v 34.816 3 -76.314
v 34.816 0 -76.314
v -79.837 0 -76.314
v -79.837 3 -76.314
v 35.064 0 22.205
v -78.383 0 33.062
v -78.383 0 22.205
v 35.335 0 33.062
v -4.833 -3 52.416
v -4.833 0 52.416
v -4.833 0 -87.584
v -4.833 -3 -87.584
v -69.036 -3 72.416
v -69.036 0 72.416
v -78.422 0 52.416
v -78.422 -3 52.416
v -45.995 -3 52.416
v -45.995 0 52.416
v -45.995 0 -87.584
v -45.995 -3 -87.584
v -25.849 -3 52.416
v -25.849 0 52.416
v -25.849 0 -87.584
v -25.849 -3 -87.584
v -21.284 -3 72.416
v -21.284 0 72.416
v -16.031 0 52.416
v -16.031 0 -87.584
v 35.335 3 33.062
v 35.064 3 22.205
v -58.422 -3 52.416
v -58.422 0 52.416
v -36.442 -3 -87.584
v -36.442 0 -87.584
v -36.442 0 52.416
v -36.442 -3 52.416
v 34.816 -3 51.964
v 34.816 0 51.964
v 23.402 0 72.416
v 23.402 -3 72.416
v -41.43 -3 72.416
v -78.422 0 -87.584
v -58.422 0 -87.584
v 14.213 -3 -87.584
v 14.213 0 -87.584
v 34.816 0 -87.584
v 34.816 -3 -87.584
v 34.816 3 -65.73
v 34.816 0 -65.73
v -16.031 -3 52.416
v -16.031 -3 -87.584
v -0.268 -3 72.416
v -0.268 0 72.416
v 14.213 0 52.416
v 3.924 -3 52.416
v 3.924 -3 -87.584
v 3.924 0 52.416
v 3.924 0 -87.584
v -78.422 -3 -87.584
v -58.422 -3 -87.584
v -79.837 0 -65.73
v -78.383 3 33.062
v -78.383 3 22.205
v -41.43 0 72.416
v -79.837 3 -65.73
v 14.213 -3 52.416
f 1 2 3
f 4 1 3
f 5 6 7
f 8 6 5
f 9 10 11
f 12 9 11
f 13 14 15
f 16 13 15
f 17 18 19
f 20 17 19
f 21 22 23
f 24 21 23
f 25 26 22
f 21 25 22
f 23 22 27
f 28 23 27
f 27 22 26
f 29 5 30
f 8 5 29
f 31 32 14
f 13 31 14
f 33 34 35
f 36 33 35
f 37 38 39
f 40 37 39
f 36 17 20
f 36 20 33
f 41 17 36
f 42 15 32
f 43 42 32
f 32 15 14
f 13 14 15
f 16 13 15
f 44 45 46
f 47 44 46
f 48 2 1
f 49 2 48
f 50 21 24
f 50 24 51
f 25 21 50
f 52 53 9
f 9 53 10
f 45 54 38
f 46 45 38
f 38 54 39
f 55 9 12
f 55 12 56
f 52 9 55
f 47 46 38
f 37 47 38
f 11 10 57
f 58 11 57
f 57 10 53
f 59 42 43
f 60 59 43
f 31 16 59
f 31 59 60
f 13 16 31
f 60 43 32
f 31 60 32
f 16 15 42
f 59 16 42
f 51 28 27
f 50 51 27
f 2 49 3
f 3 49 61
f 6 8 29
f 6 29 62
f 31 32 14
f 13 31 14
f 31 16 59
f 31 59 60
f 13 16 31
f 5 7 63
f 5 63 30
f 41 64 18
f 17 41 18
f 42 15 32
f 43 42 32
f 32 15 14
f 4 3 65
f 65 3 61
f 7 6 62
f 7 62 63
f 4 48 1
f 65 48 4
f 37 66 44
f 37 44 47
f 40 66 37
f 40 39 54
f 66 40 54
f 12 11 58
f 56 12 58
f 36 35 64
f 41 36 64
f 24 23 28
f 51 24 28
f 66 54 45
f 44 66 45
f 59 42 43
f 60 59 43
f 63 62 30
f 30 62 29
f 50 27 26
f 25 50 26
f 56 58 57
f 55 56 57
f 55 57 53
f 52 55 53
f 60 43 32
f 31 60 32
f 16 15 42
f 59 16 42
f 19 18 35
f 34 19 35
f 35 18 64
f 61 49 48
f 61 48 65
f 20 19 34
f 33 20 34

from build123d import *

# Parameters (mm, degrees)
F2_DEPTH = 3
F4_DEPTH = 3
F5_W     = 114.6537661552
F5_H     = 10.5847641826
F6_DEPTH = 3


with BuildPart() as f2:
    # F0 (on Front) → F2 (new body)
    with BuildSketch(Plane.XZ):
        Polygon((-45.9947801825, 52.4159106612), (-45.9947801825, -87.5840893388), (-36.4417050134, -87.5840893388), (-36.4417050134, 52.4159106612), (-41.430143982, 72.4159106612), align=None)
    extrude(amount=F2_DEPTH)


with BuildPart() as f2b:
    # F0 (on Front) → F2, piece 2 (new body)
    with BuildSketch(Plane.XZ):
        Polygon((-78.4224574716, 52.4159106612), (-78.4224574716, -87.5840893388), (-58.4224574716, -87.5840893388), (-58.4224574716, 52.4159106612), (-69.0362897647, 72.4159106612), align=None)
    extrude(amount=F2_DEPTH)


with BuildPart() as f2c:
    # F0 (on Front) → F2, piece 3 (new body)
    with BuildSketch(Plane.XZ):
        Polygon((-4.8327921589, 52.4159106612), (-4.8327921589, -87.5840893388), (3.9241904943, -87.5840893388), (3.9241904943, 52.4159106612), (-0.2681559585, 72.4159106612), align=None)
    extrude(amount=F2_DEPTH)


with BuildPart() as f2d:
    # F0 (on Front) → F2, piece 4 (new body)
    with BuildSketch(Plane.XZ):
        Polygon((-25.8491035459, 52.4159106612), (-25.8491035459, -87.5840893388), (-16.0306682906, -87.5840893388), (-16.0306682906, 52.4159106612), (-21.2844673454, 72.4159106612), align=None)
    extrude(amount=F2_DEPTH)


with BuildPart() as f2e:
    # F0 (on Front) → F2, piece 5 (new body)
    with BuildSketch(Plane.XZ):
        Polygon((14.2126074547, 52.4159106612), (14.2126074547, -87.5840893388), (34.8163917661, -87.5840893388), (34.8163917661, 51.9644655287), (23.4017428011, 72.4159106612), align=None)
    extrude(amount=F2_DEPTH)


with BuildPart() as f2f:
    # F1 (on face) → F2, piece 6 (new body)
    with BuildSketch(Plane.XZ):
        Polygon((-69.0362897647, 72.4159106612), (-78.4224574716, 52.4159106612), (-78.4224574716, -87.5840893388), (-58.4224574716, -87.5840893388), (-58.4224574716, 52.4159106612), align=None)
    extrude(amount=F2_DEPTH)


with BuildPart() as f4:
    # F3 (on Front) → F4 (new body)
    with BuildSketch(Plane.XZ):
        Polygon((35.0640527904, 22.2054086626), (35.3354588151, 33.0615788698), (-78.3829391003, 33.0615788698), (-78.3829391003, 22.2054086626), align=None)
    extrude(amount=-F4_DEPTH)


with BuildPart() as f6:
    # F5 (on face) → F6 (new body)
    with BuildSketch(Plane(origin=(0, 0, 0), x_dir=(-1, 0, 0), z_dir=(0, 1, 0))):
        with Locations((22.5104913116, -71.0219629109)):
            Rectangle(F5_W, F5_H)
    extrude(amount=F6_DEPTH)


solid = Compound([f2.part, f2b.part, f2c.part, f2d.part, f2e.part, f2f.part, f4.part, f6.part])
